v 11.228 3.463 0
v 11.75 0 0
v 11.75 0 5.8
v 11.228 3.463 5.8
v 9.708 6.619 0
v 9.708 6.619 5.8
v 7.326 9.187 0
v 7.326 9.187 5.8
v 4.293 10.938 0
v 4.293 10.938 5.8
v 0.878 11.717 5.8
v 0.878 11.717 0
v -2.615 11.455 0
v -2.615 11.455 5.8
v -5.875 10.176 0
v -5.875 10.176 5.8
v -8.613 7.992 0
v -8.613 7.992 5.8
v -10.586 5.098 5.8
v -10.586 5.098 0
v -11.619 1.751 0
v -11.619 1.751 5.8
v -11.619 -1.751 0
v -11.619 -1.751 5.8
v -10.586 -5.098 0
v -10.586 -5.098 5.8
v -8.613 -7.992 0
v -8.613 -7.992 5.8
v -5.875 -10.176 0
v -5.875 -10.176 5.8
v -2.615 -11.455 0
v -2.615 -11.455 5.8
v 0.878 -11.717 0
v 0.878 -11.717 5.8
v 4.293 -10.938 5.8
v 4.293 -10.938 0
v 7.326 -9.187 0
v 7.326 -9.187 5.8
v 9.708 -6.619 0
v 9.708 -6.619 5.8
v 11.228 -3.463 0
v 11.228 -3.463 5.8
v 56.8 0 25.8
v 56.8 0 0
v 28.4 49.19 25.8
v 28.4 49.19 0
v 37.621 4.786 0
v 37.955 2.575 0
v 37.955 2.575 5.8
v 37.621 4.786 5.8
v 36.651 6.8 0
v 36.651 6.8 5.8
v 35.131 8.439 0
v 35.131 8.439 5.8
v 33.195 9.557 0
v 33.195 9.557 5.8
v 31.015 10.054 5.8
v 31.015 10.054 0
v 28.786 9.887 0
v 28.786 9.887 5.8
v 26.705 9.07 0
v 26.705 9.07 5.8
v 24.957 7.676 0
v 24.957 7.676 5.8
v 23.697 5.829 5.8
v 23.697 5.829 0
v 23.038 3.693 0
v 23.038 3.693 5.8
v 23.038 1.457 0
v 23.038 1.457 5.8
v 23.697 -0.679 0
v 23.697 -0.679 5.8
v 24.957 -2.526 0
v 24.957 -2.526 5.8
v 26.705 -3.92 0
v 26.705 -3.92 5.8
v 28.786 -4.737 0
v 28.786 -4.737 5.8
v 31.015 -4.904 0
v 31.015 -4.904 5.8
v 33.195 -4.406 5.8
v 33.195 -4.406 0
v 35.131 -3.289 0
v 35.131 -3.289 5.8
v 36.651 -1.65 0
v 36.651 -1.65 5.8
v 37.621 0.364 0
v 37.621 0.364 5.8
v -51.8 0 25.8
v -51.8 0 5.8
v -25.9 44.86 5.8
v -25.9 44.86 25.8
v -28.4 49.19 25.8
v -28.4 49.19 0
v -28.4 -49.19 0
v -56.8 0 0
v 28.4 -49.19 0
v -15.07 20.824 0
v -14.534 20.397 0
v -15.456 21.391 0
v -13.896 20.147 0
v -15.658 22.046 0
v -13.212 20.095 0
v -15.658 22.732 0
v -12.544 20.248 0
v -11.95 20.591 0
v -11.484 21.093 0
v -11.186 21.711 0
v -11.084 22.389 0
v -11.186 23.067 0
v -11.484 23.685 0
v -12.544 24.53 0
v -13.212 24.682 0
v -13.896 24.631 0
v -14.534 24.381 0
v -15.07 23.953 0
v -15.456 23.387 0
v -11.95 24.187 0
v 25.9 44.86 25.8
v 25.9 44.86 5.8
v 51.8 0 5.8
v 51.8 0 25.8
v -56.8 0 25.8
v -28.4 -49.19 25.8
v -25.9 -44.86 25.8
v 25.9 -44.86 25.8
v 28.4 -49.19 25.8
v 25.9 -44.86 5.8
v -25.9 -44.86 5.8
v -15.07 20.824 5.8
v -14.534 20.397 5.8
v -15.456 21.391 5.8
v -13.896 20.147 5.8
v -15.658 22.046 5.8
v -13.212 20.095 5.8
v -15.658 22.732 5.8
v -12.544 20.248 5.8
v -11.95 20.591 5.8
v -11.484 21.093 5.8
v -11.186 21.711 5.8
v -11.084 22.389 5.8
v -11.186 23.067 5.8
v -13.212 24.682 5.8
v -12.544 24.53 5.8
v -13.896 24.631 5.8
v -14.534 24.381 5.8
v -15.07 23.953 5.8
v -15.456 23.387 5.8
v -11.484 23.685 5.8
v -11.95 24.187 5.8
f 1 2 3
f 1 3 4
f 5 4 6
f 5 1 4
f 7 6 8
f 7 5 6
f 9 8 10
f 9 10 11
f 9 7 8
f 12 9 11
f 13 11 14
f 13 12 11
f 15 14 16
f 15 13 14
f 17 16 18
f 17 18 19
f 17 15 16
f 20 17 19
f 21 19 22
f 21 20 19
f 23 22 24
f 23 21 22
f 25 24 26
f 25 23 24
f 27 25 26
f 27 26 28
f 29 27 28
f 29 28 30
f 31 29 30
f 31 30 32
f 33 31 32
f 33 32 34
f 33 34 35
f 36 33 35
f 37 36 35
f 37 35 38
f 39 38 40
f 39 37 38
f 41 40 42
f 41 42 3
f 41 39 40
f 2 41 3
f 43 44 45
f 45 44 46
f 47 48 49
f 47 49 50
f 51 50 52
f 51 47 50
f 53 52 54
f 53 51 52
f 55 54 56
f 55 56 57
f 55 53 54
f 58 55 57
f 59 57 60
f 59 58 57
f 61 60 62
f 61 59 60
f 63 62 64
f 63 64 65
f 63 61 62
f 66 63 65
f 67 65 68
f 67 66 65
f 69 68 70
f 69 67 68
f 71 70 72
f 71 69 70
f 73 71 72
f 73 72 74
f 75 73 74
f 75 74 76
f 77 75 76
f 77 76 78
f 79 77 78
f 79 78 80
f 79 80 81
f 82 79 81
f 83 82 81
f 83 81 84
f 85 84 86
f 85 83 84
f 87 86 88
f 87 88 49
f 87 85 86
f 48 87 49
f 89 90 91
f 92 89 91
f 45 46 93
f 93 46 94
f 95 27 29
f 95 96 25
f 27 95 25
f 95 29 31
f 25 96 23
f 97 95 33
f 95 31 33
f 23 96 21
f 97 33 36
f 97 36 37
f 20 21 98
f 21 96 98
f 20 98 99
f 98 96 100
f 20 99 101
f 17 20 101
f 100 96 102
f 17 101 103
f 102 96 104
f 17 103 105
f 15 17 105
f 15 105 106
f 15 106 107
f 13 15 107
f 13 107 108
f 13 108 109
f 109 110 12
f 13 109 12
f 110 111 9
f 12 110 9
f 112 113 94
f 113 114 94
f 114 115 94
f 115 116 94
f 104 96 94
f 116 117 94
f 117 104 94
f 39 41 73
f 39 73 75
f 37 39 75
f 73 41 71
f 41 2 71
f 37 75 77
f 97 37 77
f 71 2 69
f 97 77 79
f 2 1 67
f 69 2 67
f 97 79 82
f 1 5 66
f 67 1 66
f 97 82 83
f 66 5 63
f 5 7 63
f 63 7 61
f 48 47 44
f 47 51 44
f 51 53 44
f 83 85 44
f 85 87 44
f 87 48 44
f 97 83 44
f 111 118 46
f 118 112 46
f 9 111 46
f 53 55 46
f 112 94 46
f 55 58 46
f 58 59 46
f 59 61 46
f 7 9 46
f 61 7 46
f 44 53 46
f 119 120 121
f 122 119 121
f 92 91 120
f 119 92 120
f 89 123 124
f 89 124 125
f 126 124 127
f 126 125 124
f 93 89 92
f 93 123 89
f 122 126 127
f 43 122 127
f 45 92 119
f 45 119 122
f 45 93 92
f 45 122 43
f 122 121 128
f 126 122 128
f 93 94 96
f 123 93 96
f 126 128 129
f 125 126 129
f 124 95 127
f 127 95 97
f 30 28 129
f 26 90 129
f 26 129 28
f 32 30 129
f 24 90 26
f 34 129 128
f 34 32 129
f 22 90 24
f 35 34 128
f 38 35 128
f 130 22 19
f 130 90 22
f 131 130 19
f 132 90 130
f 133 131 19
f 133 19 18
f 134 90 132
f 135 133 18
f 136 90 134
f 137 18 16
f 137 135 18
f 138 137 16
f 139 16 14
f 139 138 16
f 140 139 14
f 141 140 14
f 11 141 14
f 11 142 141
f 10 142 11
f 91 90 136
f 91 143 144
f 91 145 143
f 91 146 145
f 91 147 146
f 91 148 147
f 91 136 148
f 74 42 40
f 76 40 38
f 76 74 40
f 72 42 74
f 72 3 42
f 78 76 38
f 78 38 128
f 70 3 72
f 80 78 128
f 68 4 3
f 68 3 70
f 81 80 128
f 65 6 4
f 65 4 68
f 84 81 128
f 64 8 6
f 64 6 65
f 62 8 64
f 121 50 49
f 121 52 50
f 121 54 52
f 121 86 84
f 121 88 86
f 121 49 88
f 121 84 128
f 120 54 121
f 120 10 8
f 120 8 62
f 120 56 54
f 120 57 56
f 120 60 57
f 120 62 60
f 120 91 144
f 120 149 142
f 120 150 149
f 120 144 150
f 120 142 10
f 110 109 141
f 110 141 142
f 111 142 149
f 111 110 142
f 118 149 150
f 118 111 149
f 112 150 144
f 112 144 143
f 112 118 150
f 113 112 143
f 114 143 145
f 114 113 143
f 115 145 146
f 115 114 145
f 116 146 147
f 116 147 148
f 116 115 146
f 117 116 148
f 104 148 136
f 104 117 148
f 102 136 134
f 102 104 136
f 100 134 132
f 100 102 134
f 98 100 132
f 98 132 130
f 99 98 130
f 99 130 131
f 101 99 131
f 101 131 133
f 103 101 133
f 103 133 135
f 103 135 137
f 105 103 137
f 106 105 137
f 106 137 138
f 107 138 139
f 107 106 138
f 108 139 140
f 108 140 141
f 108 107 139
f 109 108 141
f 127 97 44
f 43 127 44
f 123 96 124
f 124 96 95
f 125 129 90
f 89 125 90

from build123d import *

# Parameters (mm, degrees)
F0_R     = 2.3
F0_R_2   = 11.75
F0_R_3   = 7.5
F1_DEPTH = 5.8
F2_DEPTH = 25.8


with BuildPart() as f1:
    # F0 (on Top) → F1 (new body)
    with BuildSketch(Plane.XY):
        Polygon((25.9, 44.860116), (-25.9, 44.860116), (-51.8, 0), (-25.9, -44.860116), (25.9, -44.860116), (51.8, 0), align=None)
        with Locations((-13.384125, 22.388888)):
            Circle(F0_R, mode=Mode.SUBTRACT)
        Circle(F0_R_2, mode=Mode.SUBTRACT)
        with Locations((30.454506, 2.57507)):
            Circle(F0_R_3, mode=Mode.SUBTRACT)
    extrude(amount=F1_DEPTH)

    # F0 (on Top) → F2 (join)
    with BuildSketch(Plane.XY):
        Polygon((28.4, 49.190243), (-28.4, 49.190243), (-56.8, 0), (-28.4, -49.190243), (28.4, -49.190243), (56.8, 0), align=None)
        Polygon((-51.8, 0), (-25.9, 44.860116), (25.9, 44.860116), (51.8, 0), (25.9, -44.860116), (-25.9, -44.860116), align=None, mode=Mode.SUBTRACT)
    extrude(amount=F2_DEPTH)


solid = f1.part
